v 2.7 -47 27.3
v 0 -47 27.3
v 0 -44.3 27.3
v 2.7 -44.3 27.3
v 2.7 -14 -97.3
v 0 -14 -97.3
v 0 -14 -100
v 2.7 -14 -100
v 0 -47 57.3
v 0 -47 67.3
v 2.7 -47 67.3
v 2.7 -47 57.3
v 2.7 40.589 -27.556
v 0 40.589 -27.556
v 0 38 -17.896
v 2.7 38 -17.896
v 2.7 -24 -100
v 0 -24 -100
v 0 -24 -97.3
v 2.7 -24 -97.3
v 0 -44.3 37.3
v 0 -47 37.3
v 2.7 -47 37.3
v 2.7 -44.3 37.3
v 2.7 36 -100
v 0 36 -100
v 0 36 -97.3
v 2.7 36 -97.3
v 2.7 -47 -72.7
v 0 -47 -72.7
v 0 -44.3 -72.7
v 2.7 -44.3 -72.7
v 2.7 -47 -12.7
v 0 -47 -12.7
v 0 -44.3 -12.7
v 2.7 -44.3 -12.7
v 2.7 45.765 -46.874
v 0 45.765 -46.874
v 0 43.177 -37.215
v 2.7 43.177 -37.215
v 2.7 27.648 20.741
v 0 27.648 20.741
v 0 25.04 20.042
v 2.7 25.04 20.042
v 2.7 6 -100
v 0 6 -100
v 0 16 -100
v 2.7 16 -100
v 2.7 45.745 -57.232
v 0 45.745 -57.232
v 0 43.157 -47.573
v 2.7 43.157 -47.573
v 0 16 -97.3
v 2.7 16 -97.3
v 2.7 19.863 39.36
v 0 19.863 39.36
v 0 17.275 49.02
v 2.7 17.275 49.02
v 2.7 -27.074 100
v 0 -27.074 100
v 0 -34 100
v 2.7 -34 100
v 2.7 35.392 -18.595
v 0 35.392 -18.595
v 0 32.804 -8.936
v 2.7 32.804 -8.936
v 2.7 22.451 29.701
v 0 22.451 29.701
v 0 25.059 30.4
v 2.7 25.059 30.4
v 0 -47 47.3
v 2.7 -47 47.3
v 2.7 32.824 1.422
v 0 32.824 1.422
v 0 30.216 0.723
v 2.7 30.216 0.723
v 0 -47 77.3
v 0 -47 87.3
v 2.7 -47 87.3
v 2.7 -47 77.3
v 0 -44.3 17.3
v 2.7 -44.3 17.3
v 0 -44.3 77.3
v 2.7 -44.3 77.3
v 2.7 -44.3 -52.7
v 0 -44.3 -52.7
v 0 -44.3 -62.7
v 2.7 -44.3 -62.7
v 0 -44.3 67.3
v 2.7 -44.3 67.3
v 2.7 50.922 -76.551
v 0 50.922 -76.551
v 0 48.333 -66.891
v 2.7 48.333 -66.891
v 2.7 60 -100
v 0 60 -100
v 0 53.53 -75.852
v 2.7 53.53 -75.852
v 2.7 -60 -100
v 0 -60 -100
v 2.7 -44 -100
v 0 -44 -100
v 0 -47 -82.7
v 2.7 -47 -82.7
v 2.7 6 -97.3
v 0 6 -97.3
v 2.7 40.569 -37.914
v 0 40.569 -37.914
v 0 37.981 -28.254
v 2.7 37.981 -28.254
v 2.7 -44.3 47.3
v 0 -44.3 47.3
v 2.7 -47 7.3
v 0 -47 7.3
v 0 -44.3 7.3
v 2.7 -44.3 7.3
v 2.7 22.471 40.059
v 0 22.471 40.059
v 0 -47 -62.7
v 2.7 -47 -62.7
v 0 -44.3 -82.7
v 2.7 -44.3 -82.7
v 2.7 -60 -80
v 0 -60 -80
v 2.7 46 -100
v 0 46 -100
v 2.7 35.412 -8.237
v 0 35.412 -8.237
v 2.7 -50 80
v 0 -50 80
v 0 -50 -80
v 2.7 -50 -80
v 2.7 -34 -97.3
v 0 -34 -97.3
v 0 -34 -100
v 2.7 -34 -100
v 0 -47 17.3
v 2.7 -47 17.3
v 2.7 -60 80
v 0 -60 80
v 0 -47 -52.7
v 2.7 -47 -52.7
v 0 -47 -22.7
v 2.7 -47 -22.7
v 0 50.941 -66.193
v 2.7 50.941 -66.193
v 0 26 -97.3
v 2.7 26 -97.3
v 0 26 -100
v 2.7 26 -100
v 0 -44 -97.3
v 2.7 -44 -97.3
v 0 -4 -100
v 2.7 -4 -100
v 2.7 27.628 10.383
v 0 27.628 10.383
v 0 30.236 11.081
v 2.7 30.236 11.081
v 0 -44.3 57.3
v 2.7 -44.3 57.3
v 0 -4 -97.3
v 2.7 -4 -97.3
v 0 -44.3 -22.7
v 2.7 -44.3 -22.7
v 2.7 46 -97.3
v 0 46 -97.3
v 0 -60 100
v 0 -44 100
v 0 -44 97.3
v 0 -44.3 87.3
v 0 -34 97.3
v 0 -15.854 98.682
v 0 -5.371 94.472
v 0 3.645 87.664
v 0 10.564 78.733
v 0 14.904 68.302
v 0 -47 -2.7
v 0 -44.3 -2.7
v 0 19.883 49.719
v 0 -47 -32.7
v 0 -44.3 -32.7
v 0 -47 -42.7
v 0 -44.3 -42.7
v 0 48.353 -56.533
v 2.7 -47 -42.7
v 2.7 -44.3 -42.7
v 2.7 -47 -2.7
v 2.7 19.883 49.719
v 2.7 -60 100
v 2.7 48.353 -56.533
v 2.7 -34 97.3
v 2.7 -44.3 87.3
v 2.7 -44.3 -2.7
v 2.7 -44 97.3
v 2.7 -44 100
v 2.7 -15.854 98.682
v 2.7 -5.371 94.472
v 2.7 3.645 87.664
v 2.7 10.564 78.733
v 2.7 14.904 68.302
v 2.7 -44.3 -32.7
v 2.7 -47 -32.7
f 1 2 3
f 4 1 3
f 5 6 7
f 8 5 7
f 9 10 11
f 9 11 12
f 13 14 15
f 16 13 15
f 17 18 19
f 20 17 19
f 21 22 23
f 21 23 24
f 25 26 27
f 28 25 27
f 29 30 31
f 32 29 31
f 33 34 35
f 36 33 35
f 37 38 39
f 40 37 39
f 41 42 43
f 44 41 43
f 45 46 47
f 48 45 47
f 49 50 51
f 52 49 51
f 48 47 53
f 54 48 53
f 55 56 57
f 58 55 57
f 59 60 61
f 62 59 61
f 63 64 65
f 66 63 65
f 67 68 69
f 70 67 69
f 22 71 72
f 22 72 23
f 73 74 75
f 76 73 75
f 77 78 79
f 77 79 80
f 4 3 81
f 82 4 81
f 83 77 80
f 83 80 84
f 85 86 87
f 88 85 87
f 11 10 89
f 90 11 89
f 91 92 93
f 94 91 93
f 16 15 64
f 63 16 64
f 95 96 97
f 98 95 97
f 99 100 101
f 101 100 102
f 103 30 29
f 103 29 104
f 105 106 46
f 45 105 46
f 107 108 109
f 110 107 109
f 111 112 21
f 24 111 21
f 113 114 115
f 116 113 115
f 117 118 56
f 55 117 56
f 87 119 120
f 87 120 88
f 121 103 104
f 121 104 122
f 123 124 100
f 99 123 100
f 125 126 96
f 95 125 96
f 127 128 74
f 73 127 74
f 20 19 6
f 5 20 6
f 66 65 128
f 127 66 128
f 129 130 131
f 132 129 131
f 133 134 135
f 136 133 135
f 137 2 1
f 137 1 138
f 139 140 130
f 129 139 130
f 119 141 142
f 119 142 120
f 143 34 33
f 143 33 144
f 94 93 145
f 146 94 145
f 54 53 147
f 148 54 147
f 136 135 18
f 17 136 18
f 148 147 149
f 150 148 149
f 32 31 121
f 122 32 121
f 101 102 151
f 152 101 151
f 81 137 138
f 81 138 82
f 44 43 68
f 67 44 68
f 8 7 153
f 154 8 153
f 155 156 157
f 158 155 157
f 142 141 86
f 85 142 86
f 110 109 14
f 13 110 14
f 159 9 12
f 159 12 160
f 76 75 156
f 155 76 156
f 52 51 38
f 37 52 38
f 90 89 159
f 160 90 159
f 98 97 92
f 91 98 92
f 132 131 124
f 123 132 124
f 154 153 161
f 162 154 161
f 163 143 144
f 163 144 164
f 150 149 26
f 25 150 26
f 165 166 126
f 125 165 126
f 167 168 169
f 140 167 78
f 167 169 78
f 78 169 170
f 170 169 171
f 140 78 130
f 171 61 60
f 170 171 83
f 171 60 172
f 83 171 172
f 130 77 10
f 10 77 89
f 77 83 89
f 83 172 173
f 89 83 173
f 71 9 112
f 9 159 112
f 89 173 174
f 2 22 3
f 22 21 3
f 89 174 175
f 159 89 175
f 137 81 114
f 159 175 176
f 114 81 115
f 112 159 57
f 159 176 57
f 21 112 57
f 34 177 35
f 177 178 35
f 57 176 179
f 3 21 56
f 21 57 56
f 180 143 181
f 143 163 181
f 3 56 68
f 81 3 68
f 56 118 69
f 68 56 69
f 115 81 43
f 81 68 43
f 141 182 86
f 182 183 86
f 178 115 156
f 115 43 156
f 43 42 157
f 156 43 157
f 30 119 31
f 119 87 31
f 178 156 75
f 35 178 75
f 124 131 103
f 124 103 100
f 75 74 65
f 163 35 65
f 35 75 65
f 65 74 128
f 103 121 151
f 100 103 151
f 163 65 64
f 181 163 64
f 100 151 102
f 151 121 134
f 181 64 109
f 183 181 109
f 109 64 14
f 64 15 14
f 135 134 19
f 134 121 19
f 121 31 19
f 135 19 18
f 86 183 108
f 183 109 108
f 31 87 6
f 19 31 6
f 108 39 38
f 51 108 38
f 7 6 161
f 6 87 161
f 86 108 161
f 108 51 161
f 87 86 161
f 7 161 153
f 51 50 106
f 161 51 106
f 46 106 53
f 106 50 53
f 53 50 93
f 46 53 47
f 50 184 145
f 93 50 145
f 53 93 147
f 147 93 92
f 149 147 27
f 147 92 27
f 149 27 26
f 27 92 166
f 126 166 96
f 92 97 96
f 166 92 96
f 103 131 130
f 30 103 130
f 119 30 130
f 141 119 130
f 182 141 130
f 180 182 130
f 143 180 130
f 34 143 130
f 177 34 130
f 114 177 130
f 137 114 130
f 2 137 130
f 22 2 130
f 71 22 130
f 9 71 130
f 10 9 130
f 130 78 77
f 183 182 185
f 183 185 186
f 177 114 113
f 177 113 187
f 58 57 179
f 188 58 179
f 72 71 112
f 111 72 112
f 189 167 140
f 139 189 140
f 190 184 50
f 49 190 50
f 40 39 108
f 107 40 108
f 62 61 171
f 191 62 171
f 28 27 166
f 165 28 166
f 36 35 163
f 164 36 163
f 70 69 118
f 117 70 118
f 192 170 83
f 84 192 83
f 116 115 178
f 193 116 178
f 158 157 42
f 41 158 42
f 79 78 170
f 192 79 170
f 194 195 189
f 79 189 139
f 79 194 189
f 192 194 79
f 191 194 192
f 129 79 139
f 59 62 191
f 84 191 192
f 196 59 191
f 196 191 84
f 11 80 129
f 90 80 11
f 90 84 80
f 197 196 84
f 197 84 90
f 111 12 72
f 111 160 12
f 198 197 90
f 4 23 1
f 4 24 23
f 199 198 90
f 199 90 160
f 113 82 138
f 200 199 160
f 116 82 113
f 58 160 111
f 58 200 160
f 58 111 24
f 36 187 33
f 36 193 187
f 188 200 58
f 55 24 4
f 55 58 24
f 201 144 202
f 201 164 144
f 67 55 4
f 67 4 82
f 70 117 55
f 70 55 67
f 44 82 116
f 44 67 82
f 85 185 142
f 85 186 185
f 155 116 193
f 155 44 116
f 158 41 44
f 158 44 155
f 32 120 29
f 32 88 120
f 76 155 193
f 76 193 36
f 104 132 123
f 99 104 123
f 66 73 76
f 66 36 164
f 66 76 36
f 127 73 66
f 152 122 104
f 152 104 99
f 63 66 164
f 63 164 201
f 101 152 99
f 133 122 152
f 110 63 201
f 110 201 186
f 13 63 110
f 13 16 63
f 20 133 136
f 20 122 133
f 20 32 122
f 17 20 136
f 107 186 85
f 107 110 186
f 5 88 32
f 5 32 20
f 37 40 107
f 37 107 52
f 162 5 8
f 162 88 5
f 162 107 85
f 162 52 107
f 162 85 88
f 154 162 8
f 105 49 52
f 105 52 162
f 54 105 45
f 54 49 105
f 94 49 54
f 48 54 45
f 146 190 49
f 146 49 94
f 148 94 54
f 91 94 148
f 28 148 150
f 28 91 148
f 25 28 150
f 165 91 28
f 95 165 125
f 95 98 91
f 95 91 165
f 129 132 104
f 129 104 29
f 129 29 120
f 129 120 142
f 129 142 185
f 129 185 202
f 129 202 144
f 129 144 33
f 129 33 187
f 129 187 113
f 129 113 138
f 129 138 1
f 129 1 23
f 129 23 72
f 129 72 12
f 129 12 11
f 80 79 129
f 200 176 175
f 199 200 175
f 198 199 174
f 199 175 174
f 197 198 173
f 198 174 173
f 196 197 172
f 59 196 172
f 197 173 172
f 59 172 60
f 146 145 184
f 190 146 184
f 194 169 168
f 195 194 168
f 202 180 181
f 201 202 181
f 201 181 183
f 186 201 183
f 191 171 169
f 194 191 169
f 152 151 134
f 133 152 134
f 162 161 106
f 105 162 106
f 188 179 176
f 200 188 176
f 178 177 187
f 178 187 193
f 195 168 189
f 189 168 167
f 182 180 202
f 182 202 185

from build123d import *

# Parameters (mm, degrees)
SKETCH1_W           = 10
SKETCH1_H           = 2.7
BOSS_EXTRUDE1_DEPTH = 2.7


with BuildPart() as part:
    # Sketch1 → Boss-Extrude1 (new body)
    with BuildSketch(Plane(origin=(0, 0, 0), x_dir=(0, 0, -1), z_dir=(1, 0, 0))):
        with BuildLine():
            Line((-100, -44), (-100, -60))
            Line((-100, -60), (-80, -60))
            Line((-80, -60), (-80, -50))
            Line((-80, -50), (80, -50))
            Line((80, -50), (80, -60))
            Line((80, -60), (100, -60))
            Line((100, -60), (100, -44))
            Line((100, -44), (97.3, -44))
            Line((97.3, -44), (97.3, -34))
            Line((97.3, -34), (100, -34))
            Line((100, -34), (100, -24))
            Line((100, -24), (97.3, -24))
            Line((97.3, -24), (97.3, -14))
            Line((97.3, -14), (100, -14))
            Line((100, -14), (100, -4))
            Line((100, -4), (97.3, -4))
            Line((97.3, -4), (97.3, 6))
            Line((97.3, 6), (100, 6))
            Line((100, 6), (100, 16))
            Line((100, 16), (97.3, 16))
            Line((97.3, 16), (97.3, 26))
            Line((97.3, 26), (100, 26))
            Line((100, 26), (100, 36))
            Line((100, 36), (97.3, 36))
            Line((97.3, 36), (97.3, 46))
            Line((97.3, 46), (100, 46))
            Line((100, 46), (100, 60))
            Line((100, 60), (75.851854343, 53.529523872))
            Line((75.851854343, 53.529523872), (76.550665765, 50.921524141))
            Line((76.550665765, 50.921524141), (66.891407502, 48.33333369))
            Line((66.891407502, 48.33333369), (66.19259608, 50.941333421))
            Line((66.19259608, 50.941333421), (56.533337817, 48.35314297))
            Line((56.533337817, 48.35314297), (57.232149239, 45.745143239))
            Line((57.232149239, 45.745143239), (47.572890976, 43.156952788))
            Line((47.572890976, 43.156952788), (46.874079554, 45.764952519))
            Line((46.874079554, 45.764952519), (37.214821291, 43.176762068))
            Line((37.214821291, 43.176762068), (37.913632713, 40.568762337))
            Line((37.913632713, 40.568762337), (28.25437445, 37.980571886))
            Line((28.25437445, 37.980571886), (27.555563028, 40.588571617))
            Line((27.555563028, 40.588571617), (17.896304765, 38.000381166))
            Line((17.896304765, 38.000381166), (18.595116187, 35.392381435))
            Line((18.595116187, 35.392381435), (8.935857924, 32.804190984))
            Line((8.935857924, 32.804190984), (8.237046503, 35.412190715))
            Line((8.237046503, 35.412190715), (-1.42221176, 32.824000264))
            Line((-1.42221176, 32.824000264), (-0.723400339, 30.216000533))
            Line((-0.723400339, 30.216000533), (-10.382658601, 27.627810082))
            Line((-10.382658601, 27.627810082), (-11.081470023, 30.235809813))
            Line((-11.081470023, 30.235809813), (-20.740728286, 27.647619362))
            Line((-20.740728286, 27.647619362), (-20.041916864, 25.039619631))
            Line((-20.041916864, 25.039619631), (-29.701175127, 22.45142918))
            Line((-29.701175127, 22.45142918), (-30.399986549, 25.059428911))
            Line((-30.399986549, 25.059428911), (-40.059244812, 22.47123846))
            Line((-40.059244812, 22.47123846), (-39.36043339, 19.863238729))
            Line((-39.36043339, 19.863238729), (-49.019691653, 17.275048278))
            Line((-49.019691653, 17.275048278), (-49.718503075, 19.883048009))
            Line((-49.718503075, 19.883048009), (-68.302221487, 14.903555668))
            ThreePointArc((-68.302221487, 14.903555668), (-91.366544651, -0.636913735), (-100, -27.074247963))
            Line((-100, -27.074247963), (-100, -34))
            Line((-100, -34), (-97.3, -34))
            Line((-97.3, -34), (-97.3, -44))
            Line((-97.3, -44), (-100, -44))
        make_face()
        with Locations((-82.3, -45.65)):
            Rectangle(SKETCH1_W, SKETCH1_H, mode=Mode.SUBTRACT)
        with Locations((-62.3, -45.65)):
            Rectangle(SKETCH1_W, SKETCH1_H, mode=Mode.SUBTRACT)
        with Locations((-42.3, -45.65)):
            Rectangle(SKETCH1_W, SKETCH1_H, mode=Mode.SUBTRACT)
        with Locations((-22.3, -45.65)):
            Rectangle(SKETCH1_W, SKETCH1_H, mode=Mode.SUBTRACT)
        with Locations((-2.3, -45.65)):
            Rectangle(SKETCH1_W, SKETCH1_H, mode=Mode.SUBTRACT)
        with Locations((17.7, -45.65)):
            Rectangle(SKETCH1_W, SKETCH1_H, mode=Mode.SUBTRACT)
        with Locations((37.7, -45.65)):
            Rectangle(SKETCH1_W, SKETCH1_H, mode=Mode.SUBTRACT)
        with Locations((57.7, -45.65)):
            Rectangle(SKETCH1_W, SKETCH1_H, mode=Mode.SUBTRACT)
        with Locations((77.7, -45.65)):
            Rectangle(SKETCH1_W, SKETCH1_H, mode=Mode.SUBTRACT)
    extrude(amount=BOSS_EXTRUDE1_DEPTH)


solid = part.part
